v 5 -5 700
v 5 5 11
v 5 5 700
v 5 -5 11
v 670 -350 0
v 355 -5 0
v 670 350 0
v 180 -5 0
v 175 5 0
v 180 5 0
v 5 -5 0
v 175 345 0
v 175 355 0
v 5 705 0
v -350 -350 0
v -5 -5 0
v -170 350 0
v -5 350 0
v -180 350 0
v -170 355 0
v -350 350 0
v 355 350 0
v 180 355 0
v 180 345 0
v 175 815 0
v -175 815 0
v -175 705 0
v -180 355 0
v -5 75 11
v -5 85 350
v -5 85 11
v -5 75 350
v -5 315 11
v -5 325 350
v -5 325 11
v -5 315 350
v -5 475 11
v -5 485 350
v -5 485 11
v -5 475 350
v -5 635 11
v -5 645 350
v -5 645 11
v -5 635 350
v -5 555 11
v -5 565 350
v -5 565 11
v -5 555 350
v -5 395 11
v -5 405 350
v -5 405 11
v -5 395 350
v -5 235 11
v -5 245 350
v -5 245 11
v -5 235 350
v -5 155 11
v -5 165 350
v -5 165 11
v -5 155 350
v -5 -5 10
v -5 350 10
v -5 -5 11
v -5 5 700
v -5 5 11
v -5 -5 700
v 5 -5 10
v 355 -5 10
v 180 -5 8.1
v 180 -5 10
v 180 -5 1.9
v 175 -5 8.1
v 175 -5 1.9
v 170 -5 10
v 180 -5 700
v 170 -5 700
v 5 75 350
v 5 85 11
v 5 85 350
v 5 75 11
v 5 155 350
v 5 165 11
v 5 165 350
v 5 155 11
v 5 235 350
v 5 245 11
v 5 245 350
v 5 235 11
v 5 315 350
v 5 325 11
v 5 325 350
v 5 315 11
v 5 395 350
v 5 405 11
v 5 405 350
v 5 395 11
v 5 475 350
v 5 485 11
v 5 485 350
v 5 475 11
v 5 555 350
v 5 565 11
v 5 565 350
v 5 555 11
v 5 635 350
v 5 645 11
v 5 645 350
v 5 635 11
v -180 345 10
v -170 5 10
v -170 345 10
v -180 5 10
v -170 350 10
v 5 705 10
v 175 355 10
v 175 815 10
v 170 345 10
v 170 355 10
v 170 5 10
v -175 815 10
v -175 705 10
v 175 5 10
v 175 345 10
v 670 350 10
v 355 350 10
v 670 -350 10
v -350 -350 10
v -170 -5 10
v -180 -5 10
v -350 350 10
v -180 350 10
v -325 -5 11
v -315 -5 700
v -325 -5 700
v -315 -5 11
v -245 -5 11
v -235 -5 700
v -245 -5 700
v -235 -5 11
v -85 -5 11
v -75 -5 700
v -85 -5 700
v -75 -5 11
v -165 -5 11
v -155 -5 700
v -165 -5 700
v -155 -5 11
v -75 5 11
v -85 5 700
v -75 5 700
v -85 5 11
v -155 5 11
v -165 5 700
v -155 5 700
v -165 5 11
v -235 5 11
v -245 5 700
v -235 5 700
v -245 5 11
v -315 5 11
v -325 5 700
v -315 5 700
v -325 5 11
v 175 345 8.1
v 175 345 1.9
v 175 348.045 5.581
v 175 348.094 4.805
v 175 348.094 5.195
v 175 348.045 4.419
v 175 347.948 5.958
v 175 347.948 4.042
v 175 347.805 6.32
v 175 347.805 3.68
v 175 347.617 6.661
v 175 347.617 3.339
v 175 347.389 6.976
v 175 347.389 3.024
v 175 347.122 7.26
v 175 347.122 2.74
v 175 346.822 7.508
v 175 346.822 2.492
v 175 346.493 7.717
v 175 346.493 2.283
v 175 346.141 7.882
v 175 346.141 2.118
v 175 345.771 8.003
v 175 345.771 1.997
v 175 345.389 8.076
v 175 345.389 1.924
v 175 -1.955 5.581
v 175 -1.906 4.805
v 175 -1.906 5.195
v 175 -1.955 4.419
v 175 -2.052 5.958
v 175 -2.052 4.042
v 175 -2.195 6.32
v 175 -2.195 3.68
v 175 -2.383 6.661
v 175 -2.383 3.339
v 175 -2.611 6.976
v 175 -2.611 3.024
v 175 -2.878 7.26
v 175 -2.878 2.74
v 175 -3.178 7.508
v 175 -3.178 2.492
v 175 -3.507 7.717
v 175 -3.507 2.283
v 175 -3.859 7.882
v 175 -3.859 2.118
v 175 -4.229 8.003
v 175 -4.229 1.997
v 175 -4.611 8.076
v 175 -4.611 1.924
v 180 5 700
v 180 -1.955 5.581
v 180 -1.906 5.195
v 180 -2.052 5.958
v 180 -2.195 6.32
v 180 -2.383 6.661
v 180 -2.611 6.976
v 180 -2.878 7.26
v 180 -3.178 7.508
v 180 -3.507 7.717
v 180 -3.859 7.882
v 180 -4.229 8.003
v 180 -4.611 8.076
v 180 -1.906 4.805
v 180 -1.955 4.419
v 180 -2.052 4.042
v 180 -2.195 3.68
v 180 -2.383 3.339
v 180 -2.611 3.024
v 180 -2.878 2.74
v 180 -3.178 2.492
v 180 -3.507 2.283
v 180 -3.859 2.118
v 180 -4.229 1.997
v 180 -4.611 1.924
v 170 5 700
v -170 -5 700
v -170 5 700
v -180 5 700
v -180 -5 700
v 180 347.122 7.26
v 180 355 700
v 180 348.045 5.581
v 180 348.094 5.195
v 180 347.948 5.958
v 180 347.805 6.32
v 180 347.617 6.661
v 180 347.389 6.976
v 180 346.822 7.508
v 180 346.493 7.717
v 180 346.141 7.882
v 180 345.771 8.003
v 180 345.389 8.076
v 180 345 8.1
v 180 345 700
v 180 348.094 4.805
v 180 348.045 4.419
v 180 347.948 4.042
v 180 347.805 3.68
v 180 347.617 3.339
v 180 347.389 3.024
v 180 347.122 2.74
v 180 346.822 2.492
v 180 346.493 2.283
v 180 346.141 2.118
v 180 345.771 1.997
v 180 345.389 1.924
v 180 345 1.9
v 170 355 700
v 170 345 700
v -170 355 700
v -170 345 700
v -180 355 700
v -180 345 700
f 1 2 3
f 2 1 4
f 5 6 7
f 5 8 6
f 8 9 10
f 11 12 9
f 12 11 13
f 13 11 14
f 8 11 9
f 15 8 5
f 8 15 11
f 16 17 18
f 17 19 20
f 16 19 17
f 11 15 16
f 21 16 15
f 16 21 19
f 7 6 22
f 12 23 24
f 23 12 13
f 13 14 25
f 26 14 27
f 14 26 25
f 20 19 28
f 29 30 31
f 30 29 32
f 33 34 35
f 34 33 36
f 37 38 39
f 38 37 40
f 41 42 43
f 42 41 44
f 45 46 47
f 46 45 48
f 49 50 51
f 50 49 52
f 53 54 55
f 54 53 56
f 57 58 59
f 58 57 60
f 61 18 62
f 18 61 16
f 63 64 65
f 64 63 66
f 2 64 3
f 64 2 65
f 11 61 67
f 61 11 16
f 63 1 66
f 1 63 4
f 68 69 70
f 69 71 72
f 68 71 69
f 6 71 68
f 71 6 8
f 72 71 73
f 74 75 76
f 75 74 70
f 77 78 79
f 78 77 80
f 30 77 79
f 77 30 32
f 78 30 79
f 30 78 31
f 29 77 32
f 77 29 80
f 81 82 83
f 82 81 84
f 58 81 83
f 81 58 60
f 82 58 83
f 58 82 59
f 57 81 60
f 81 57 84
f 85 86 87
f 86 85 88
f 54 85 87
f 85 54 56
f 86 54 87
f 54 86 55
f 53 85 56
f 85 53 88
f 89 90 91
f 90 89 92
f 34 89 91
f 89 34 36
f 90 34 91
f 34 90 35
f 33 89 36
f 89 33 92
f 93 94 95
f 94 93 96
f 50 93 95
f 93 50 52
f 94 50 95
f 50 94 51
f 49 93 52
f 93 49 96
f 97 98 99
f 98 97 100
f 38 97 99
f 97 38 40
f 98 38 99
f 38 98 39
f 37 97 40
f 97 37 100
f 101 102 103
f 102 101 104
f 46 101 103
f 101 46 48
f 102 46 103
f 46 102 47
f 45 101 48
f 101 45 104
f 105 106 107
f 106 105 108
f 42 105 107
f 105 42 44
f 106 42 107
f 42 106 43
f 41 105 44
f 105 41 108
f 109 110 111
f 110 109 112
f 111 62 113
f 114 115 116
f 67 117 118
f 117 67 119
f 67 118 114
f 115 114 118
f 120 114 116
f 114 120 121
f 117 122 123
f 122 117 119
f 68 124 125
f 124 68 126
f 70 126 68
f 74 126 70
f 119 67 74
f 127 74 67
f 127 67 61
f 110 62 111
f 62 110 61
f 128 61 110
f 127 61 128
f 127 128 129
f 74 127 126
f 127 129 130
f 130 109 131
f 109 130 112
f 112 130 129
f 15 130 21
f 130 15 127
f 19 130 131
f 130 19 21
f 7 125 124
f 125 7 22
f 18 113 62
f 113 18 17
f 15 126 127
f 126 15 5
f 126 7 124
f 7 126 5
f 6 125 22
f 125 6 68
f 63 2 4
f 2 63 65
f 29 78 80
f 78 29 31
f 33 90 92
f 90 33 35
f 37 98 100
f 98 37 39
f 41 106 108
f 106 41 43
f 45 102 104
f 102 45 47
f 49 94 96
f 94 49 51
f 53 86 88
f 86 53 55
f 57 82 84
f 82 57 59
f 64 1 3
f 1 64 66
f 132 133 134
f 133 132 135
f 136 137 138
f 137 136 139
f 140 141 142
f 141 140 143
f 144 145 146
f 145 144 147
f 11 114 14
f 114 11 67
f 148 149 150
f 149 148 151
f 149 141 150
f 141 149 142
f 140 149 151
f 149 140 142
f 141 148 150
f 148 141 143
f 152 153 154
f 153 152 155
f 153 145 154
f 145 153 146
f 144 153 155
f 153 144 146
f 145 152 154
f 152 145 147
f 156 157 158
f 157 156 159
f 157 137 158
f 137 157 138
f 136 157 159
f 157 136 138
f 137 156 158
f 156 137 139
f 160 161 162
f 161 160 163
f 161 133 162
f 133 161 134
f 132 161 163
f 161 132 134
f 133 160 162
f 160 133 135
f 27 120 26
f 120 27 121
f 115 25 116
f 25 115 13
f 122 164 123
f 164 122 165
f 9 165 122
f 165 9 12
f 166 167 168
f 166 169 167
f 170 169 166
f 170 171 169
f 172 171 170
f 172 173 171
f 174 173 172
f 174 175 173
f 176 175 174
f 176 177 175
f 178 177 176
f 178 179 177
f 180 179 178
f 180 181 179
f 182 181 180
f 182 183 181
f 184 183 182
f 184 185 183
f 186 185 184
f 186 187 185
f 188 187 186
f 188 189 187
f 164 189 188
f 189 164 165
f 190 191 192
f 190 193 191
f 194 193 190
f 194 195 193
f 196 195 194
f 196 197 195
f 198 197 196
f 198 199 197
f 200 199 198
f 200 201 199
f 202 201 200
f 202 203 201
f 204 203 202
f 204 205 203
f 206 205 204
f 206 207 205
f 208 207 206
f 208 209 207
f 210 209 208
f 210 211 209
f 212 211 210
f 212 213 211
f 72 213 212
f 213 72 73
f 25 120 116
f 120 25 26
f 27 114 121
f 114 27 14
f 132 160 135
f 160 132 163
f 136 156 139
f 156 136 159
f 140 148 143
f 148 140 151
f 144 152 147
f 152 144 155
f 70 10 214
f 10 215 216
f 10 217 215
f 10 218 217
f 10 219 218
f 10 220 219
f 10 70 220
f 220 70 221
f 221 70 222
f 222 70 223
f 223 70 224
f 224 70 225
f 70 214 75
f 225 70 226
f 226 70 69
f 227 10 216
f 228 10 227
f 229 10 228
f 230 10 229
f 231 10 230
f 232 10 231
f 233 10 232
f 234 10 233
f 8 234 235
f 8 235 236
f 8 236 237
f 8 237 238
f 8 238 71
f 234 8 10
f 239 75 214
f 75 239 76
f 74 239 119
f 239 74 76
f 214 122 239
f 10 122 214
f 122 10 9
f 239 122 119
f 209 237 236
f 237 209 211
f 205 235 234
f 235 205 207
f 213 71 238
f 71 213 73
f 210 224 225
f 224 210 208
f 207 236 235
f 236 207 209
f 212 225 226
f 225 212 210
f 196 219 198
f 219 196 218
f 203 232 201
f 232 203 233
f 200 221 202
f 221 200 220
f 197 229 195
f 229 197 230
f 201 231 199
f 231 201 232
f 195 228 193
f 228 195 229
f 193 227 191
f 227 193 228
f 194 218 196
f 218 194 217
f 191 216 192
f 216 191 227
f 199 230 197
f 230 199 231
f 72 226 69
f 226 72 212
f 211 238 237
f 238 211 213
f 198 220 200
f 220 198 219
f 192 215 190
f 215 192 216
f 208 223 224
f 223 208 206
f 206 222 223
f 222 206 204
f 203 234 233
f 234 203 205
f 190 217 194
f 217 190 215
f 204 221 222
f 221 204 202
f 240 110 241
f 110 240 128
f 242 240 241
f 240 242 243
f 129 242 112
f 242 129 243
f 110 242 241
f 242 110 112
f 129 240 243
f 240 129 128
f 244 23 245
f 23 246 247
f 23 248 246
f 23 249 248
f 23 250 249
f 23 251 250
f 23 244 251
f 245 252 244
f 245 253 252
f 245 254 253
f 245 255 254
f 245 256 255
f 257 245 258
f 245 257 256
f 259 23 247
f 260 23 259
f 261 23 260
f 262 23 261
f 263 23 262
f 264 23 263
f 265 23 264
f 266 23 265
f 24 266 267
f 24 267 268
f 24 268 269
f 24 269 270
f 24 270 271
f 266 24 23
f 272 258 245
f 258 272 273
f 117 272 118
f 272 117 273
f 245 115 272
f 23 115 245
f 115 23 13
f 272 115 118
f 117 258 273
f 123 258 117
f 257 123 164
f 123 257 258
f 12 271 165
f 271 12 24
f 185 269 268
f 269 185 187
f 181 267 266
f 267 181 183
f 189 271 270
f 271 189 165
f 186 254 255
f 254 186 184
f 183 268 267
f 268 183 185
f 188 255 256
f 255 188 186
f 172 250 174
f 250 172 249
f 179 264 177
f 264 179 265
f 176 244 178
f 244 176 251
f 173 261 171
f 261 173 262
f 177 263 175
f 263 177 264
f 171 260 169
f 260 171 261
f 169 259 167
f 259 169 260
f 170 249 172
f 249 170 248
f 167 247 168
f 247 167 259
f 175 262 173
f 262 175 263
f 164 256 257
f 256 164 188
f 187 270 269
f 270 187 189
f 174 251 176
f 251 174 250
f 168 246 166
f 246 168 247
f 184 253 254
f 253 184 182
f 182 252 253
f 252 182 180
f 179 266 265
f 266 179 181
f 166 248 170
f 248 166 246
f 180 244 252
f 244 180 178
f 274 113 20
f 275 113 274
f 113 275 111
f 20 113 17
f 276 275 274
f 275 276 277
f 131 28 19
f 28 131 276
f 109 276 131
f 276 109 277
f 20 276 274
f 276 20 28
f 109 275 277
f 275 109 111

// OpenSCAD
module bar(length, width, height) {
  translate([-width/2, -width/2, 0]) cube([width, width, length]);
}

module side_panel(width, height, bar_width, gap) {
  difference() {
    union() {
      for (y = [0:gap+bar_width:height]) {
        translate([0, y, 0]) bar(width, bar_width, bar_width);
      }
      for (x = [0:gap+bar_width:width]) {
        translate([x, 0, 0]) bar(bar_width, height, bar_width);
      }
    }
    translate([-bar_width/2, -bar_width/2, -1]) cube([width+bar_width, height+bar_width, bar_width+2]);
  }
}

module corner_post(length, width) {
  difference() {
    bar(length, width, width);
    translate([-width/2, -width/2, width/2]) rotate([0, 90, 0]) cylinder(h=width+1, d=6.2, $fn=50);
  }
}

// Front and Back Panels
side_panel(350, 700, 10, 70);

// Left and Right Panels
rotate([0, 0, 90]) side_panel(700, 350, 10, 70);

// Corner Posts
translate([175, 0, 0]) corner_post(700, 10);
translate([-175, 0, 0]) corner_post(700, 10);
translate([175, 350, 0]) corner_post(700, 10);
translate([-175, 350, 0]) corner_post(700, 10);
